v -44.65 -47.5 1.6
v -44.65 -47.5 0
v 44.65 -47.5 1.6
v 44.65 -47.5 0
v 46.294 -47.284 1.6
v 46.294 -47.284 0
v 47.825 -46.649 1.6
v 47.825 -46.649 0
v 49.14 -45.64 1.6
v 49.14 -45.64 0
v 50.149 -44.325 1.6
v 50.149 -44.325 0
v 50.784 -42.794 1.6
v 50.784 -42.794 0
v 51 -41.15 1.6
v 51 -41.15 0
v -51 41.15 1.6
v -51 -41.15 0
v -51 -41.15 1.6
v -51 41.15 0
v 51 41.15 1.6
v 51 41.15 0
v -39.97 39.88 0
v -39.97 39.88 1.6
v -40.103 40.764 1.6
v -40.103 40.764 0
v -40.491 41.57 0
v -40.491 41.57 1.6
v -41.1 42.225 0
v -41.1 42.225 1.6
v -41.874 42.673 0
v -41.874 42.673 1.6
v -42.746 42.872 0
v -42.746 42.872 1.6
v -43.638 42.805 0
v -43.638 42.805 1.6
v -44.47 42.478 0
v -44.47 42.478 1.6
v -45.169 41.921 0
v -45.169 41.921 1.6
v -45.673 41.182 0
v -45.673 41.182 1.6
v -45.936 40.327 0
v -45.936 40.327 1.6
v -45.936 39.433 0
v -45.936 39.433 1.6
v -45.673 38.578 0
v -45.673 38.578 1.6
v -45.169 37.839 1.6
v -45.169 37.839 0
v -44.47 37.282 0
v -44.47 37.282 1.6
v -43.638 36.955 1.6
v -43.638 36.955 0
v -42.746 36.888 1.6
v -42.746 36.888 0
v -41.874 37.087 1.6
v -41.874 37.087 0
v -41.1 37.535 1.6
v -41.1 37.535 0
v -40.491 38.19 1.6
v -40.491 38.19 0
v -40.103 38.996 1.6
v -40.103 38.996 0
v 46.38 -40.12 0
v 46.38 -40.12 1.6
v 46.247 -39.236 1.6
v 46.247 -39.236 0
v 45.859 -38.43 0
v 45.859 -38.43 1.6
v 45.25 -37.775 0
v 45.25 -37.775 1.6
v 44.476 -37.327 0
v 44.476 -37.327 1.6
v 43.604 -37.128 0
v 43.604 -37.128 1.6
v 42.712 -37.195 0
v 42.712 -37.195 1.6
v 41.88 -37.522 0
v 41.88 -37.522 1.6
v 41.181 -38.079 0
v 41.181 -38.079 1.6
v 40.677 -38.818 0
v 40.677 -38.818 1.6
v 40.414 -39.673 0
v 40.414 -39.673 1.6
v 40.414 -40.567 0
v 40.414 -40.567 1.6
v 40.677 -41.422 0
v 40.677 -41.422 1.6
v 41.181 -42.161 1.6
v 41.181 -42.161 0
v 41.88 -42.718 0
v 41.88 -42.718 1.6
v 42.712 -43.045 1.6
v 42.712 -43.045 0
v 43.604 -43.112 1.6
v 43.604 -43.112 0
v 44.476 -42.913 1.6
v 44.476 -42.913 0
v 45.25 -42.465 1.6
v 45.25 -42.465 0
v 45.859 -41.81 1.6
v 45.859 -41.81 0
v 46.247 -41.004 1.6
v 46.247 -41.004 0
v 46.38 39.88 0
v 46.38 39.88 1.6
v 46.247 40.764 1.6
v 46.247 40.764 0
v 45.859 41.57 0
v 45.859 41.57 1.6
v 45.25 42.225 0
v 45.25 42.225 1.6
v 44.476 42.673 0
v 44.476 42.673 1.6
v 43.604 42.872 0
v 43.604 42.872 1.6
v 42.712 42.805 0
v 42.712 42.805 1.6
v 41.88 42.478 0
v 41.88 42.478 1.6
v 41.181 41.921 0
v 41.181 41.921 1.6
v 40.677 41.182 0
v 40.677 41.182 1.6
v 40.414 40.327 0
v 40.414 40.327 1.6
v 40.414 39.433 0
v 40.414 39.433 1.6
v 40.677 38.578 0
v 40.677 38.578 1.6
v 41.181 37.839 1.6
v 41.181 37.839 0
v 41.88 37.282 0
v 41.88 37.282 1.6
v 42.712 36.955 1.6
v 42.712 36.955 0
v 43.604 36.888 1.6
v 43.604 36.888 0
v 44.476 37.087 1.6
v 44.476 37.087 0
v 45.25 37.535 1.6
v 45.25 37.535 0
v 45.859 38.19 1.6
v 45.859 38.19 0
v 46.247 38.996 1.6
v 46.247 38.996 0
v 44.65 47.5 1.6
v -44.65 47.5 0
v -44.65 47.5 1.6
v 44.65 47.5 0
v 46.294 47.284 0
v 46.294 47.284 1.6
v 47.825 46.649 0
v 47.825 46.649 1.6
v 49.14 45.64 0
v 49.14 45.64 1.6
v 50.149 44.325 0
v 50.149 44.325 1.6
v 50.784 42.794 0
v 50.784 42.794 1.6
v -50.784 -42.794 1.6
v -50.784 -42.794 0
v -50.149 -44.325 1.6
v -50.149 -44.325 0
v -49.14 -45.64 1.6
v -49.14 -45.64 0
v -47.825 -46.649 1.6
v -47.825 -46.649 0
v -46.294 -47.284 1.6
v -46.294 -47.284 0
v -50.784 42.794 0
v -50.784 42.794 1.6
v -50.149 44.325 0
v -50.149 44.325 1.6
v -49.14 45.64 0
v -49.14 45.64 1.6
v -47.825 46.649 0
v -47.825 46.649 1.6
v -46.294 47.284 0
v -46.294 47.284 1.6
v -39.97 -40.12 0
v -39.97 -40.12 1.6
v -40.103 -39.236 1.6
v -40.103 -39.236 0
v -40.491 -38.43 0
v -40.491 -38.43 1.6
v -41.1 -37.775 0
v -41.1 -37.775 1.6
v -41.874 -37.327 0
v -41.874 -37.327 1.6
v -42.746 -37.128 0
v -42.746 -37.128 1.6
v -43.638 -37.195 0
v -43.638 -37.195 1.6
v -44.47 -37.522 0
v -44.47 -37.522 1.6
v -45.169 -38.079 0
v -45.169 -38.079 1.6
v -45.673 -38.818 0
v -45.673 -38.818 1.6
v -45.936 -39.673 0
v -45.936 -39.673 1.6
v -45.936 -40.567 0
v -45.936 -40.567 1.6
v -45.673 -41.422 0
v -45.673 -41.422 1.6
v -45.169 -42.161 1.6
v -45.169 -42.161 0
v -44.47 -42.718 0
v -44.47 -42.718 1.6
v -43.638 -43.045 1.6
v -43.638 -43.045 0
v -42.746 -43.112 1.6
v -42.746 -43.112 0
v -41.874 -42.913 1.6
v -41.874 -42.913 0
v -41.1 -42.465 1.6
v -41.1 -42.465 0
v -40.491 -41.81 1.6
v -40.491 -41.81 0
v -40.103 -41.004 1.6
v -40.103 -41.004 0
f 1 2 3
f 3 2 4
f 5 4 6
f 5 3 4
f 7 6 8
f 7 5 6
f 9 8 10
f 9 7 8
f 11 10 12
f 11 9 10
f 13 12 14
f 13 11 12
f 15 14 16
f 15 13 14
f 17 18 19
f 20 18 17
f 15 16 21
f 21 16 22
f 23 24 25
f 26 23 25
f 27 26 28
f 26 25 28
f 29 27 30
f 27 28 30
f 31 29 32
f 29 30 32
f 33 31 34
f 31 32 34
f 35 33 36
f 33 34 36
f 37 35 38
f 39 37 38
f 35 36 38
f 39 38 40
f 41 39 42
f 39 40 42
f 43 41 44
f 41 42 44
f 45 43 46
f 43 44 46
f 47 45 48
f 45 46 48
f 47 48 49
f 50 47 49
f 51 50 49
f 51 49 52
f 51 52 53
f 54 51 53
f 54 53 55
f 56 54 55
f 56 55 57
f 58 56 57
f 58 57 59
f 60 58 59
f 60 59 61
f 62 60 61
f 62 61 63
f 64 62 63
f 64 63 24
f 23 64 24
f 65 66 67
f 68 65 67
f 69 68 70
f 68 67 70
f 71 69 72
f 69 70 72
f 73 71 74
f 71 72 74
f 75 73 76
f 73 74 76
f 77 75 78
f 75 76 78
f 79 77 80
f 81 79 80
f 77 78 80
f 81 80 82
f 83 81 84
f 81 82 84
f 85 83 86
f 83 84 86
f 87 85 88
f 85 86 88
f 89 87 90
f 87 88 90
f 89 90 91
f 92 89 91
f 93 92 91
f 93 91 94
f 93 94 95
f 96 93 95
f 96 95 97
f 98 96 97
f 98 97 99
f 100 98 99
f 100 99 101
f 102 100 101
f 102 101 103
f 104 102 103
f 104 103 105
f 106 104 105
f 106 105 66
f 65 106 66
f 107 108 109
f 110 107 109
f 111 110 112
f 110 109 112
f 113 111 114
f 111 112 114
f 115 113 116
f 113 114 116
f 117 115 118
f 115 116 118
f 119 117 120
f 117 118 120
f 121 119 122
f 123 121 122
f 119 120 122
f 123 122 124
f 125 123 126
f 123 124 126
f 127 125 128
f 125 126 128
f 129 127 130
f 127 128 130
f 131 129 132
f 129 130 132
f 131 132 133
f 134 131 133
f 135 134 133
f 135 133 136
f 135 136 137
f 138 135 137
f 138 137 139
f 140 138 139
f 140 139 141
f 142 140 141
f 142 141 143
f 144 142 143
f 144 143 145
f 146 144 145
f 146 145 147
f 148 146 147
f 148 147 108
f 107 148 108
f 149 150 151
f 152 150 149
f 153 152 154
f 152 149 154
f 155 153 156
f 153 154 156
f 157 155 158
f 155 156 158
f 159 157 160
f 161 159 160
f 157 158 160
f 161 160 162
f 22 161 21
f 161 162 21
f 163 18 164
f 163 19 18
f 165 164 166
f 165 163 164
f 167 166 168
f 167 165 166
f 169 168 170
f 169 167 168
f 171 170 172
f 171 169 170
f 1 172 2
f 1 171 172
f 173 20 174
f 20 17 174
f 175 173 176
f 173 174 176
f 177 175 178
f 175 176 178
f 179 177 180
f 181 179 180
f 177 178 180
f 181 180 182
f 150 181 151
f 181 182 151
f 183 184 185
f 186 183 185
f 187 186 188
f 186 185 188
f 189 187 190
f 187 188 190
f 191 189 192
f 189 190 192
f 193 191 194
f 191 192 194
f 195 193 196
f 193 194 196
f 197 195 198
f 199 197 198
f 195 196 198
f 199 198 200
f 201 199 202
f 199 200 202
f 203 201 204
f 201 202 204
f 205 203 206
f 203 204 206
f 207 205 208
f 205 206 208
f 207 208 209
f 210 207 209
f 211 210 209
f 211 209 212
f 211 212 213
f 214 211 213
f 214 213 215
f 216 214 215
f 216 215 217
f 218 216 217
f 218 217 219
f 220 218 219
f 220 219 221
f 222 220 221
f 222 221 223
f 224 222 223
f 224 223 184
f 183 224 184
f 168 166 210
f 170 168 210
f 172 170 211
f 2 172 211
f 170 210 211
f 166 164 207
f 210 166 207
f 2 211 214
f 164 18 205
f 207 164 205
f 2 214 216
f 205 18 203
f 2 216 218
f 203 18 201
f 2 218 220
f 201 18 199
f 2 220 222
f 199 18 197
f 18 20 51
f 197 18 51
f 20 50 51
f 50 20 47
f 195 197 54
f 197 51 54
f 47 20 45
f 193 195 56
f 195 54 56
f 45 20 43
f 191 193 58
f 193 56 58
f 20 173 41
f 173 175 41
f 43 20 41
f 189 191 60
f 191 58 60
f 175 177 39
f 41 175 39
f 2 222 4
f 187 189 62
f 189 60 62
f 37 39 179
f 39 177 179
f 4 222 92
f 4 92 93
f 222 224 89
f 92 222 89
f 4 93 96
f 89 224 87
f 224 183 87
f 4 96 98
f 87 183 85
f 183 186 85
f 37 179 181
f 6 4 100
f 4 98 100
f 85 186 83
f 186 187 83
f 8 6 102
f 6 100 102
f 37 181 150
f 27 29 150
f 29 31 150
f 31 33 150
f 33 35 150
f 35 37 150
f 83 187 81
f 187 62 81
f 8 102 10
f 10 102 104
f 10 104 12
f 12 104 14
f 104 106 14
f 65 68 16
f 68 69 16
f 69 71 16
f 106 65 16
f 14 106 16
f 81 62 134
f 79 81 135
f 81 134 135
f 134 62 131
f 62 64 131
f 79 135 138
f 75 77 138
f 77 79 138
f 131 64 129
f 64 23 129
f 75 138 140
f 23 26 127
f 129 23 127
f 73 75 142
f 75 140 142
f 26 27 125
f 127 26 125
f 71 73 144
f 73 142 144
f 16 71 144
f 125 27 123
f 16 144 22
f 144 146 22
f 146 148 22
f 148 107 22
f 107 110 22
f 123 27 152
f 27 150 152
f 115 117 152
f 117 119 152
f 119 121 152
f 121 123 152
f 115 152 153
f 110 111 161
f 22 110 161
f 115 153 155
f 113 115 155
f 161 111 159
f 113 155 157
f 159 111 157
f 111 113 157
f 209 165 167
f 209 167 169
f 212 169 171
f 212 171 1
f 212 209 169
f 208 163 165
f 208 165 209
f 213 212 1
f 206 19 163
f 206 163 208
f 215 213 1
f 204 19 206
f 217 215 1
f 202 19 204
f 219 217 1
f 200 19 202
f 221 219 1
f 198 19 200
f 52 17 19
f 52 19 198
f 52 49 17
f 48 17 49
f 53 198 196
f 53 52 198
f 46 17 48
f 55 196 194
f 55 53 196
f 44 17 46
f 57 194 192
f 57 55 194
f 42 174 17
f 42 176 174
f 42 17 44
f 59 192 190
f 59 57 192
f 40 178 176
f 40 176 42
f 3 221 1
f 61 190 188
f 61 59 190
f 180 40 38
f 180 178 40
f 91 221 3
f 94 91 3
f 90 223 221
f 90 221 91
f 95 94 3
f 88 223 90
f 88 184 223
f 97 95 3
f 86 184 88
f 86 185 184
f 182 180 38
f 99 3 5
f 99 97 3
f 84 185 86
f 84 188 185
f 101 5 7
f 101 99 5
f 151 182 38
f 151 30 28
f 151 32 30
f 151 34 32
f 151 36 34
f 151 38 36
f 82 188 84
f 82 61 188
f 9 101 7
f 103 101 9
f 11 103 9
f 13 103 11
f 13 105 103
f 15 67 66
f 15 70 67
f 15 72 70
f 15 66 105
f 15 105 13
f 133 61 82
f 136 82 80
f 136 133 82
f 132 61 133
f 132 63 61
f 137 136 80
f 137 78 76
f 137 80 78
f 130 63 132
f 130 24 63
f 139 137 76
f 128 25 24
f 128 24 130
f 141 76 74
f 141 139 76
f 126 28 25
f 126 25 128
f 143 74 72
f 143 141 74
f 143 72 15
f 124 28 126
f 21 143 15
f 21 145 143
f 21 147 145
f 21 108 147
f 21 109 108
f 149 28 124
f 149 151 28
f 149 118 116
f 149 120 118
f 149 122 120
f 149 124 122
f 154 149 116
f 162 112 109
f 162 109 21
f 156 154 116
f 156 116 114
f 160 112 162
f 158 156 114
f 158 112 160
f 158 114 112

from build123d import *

# Parameters (mm, degrees)
SKETCH086_W   = 102
SKETCH086_H   = 95
PAD035_DEPTH  = 1.6
SKETCH087_R   = 3
HOLE010_DEPTH = 25
FILLET044_R   = 6.35


with BuildPart() as part:
    # Sketch086 → Pad035 (new body)
    with BuildSketch(Plane.XY):
        Rectangle(SKETCH086_W, SKETCH086_H)
    extrude(amount=PAD035_DEPTH)

    # Sketch087 (on Face6 of Pad035) → Hole010 (cut)
    with BuildSketch(Plane.XY.offset(1.6)):
        with Locations((43.38, 39.88)):
            Circle(SKETCH087_R)
        with Locations((43.38, -40.12)):
            Circle(SKETCH087_R)
        with Locations((-42.97, -40.12)):
            Circle(SKETCH087_R)
        with Locations((-42.97, 39.88)):
            Circle(SKETCH087_R)
    extrude(amount=-HOLE010_DEPTH, mode=Mode.SUBTRACT)

    # Fillet044
    fillet044_edges = [part.edges().sort_by_distance(p)[0] for p in [
        (-51, -47.5, 0.8),
        (-51, 47.5, 0.8),
        (51, 47.5, 0.8),
        (51, -47.5, 0.8),
    ]]
    fillet(fillet044_edges, radius=FILLET044_R)


solid = part.part
